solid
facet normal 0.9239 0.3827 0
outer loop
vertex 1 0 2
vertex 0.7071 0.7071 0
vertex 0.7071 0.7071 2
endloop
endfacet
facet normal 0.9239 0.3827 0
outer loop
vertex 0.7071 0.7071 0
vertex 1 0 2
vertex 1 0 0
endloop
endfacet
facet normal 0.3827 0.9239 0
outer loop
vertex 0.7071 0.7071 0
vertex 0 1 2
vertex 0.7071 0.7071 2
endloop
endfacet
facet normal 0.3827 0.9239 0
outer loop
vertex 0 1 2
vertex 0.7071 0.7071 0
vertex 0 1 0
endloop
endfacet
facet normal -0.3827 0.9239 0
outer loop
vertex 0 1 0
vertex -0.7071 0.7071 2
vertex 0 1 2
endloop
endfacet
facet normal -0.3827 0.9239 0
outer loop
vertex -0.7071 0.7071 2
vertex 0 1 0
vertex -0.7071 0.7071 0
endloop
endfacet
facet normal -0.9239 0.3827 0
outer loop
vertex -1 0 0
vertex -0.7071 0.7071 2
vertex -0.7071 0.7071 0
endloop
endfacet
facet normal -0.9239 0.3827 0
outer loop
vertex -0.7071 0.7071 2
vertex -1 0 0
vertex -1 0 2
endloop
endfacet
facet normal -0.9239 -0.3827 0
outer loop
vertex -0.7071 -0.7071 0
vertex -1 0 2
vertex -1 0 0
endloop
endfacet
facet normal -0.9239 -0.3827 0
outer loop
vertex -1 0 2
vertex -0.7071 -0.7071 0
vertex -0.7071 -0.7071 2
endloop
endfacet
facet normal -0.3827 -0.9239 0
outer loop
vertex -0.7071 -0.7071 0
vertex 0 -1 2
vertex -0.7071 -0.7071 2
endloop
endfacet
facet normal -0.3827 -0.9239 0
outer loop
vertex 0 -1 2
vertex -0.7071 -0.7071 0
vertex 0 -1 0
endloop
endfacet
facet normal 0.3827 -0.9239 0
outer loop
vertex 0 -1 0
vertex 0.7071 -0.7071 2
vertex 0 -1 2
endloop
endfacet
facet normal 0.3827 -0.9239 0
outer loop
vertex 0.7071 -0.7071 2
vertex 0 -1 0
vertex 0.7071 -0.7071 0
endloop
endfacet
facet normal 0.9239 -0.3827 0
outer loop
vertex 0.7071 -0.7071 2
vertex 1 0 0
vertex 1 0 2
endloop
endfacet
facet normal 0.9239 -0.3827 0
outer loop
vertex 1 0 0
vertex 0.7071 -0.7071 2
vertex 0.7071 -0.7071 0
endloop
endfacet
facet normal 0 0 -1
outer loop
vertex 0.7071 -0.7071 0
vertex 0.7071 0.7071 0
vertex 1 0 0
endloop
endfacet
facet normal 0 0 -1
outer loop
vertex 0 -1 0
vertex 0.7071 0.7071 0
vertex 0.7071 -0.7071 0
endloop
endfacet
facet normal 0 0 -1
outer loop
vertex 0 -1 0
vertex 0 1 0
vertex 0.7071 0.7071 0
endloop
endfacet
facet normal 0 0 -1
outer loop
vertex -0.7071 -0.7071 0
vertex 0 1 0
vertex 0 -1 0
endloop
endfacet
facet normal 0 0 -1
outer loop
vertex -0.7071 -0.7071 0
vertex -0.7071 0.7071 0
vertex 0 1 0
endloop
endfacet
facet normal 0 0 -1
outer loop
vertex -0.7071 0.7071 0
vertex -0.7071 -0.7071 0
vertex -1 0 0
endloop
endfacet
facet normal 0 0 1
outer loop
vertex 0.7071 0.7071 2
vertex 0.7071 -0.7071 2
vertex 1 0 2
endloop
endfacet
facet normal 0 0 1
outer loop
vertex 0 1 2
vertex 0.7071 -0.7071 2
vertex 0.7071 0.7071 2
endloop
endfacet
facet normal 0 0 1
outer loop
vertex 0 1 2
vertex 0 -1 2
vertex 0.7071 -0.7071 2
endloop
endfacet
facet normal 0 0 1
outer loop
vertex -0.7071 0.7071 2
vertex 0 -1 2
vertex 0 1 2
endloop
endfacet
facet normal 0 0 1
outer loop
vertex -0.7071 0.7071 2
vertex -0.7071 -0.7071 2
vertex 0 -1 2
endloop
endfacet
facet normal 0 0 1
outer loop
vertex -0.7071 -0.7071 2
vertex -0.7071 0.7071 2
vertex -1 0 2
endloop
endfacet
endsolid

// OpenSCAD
use <lib.scad>

module mast() {
	union() {
		translate([0,0,5.0]) cyl(0.25, 0.25, 10.0);
		translate([0,0,10.0]) box([4.0, 0.1, 0.1]);
	}
}

module bucket() {
	translate([0,0,1]) union() {
		cyl(1,1,2);
		if ($fn > 8) {
			translate([0,0,1.5]) cyl(0.1,0.1,3.0);
		}
	}
}

module terminusBase() {
	translate([0,0,1]) box([5,5,2]);
}

module towerBase() {
	translate([0,0,1]) box([3,3,2]);
}

//mast($fn=72);
//mast($fn=12);
bucket($fn=8);
